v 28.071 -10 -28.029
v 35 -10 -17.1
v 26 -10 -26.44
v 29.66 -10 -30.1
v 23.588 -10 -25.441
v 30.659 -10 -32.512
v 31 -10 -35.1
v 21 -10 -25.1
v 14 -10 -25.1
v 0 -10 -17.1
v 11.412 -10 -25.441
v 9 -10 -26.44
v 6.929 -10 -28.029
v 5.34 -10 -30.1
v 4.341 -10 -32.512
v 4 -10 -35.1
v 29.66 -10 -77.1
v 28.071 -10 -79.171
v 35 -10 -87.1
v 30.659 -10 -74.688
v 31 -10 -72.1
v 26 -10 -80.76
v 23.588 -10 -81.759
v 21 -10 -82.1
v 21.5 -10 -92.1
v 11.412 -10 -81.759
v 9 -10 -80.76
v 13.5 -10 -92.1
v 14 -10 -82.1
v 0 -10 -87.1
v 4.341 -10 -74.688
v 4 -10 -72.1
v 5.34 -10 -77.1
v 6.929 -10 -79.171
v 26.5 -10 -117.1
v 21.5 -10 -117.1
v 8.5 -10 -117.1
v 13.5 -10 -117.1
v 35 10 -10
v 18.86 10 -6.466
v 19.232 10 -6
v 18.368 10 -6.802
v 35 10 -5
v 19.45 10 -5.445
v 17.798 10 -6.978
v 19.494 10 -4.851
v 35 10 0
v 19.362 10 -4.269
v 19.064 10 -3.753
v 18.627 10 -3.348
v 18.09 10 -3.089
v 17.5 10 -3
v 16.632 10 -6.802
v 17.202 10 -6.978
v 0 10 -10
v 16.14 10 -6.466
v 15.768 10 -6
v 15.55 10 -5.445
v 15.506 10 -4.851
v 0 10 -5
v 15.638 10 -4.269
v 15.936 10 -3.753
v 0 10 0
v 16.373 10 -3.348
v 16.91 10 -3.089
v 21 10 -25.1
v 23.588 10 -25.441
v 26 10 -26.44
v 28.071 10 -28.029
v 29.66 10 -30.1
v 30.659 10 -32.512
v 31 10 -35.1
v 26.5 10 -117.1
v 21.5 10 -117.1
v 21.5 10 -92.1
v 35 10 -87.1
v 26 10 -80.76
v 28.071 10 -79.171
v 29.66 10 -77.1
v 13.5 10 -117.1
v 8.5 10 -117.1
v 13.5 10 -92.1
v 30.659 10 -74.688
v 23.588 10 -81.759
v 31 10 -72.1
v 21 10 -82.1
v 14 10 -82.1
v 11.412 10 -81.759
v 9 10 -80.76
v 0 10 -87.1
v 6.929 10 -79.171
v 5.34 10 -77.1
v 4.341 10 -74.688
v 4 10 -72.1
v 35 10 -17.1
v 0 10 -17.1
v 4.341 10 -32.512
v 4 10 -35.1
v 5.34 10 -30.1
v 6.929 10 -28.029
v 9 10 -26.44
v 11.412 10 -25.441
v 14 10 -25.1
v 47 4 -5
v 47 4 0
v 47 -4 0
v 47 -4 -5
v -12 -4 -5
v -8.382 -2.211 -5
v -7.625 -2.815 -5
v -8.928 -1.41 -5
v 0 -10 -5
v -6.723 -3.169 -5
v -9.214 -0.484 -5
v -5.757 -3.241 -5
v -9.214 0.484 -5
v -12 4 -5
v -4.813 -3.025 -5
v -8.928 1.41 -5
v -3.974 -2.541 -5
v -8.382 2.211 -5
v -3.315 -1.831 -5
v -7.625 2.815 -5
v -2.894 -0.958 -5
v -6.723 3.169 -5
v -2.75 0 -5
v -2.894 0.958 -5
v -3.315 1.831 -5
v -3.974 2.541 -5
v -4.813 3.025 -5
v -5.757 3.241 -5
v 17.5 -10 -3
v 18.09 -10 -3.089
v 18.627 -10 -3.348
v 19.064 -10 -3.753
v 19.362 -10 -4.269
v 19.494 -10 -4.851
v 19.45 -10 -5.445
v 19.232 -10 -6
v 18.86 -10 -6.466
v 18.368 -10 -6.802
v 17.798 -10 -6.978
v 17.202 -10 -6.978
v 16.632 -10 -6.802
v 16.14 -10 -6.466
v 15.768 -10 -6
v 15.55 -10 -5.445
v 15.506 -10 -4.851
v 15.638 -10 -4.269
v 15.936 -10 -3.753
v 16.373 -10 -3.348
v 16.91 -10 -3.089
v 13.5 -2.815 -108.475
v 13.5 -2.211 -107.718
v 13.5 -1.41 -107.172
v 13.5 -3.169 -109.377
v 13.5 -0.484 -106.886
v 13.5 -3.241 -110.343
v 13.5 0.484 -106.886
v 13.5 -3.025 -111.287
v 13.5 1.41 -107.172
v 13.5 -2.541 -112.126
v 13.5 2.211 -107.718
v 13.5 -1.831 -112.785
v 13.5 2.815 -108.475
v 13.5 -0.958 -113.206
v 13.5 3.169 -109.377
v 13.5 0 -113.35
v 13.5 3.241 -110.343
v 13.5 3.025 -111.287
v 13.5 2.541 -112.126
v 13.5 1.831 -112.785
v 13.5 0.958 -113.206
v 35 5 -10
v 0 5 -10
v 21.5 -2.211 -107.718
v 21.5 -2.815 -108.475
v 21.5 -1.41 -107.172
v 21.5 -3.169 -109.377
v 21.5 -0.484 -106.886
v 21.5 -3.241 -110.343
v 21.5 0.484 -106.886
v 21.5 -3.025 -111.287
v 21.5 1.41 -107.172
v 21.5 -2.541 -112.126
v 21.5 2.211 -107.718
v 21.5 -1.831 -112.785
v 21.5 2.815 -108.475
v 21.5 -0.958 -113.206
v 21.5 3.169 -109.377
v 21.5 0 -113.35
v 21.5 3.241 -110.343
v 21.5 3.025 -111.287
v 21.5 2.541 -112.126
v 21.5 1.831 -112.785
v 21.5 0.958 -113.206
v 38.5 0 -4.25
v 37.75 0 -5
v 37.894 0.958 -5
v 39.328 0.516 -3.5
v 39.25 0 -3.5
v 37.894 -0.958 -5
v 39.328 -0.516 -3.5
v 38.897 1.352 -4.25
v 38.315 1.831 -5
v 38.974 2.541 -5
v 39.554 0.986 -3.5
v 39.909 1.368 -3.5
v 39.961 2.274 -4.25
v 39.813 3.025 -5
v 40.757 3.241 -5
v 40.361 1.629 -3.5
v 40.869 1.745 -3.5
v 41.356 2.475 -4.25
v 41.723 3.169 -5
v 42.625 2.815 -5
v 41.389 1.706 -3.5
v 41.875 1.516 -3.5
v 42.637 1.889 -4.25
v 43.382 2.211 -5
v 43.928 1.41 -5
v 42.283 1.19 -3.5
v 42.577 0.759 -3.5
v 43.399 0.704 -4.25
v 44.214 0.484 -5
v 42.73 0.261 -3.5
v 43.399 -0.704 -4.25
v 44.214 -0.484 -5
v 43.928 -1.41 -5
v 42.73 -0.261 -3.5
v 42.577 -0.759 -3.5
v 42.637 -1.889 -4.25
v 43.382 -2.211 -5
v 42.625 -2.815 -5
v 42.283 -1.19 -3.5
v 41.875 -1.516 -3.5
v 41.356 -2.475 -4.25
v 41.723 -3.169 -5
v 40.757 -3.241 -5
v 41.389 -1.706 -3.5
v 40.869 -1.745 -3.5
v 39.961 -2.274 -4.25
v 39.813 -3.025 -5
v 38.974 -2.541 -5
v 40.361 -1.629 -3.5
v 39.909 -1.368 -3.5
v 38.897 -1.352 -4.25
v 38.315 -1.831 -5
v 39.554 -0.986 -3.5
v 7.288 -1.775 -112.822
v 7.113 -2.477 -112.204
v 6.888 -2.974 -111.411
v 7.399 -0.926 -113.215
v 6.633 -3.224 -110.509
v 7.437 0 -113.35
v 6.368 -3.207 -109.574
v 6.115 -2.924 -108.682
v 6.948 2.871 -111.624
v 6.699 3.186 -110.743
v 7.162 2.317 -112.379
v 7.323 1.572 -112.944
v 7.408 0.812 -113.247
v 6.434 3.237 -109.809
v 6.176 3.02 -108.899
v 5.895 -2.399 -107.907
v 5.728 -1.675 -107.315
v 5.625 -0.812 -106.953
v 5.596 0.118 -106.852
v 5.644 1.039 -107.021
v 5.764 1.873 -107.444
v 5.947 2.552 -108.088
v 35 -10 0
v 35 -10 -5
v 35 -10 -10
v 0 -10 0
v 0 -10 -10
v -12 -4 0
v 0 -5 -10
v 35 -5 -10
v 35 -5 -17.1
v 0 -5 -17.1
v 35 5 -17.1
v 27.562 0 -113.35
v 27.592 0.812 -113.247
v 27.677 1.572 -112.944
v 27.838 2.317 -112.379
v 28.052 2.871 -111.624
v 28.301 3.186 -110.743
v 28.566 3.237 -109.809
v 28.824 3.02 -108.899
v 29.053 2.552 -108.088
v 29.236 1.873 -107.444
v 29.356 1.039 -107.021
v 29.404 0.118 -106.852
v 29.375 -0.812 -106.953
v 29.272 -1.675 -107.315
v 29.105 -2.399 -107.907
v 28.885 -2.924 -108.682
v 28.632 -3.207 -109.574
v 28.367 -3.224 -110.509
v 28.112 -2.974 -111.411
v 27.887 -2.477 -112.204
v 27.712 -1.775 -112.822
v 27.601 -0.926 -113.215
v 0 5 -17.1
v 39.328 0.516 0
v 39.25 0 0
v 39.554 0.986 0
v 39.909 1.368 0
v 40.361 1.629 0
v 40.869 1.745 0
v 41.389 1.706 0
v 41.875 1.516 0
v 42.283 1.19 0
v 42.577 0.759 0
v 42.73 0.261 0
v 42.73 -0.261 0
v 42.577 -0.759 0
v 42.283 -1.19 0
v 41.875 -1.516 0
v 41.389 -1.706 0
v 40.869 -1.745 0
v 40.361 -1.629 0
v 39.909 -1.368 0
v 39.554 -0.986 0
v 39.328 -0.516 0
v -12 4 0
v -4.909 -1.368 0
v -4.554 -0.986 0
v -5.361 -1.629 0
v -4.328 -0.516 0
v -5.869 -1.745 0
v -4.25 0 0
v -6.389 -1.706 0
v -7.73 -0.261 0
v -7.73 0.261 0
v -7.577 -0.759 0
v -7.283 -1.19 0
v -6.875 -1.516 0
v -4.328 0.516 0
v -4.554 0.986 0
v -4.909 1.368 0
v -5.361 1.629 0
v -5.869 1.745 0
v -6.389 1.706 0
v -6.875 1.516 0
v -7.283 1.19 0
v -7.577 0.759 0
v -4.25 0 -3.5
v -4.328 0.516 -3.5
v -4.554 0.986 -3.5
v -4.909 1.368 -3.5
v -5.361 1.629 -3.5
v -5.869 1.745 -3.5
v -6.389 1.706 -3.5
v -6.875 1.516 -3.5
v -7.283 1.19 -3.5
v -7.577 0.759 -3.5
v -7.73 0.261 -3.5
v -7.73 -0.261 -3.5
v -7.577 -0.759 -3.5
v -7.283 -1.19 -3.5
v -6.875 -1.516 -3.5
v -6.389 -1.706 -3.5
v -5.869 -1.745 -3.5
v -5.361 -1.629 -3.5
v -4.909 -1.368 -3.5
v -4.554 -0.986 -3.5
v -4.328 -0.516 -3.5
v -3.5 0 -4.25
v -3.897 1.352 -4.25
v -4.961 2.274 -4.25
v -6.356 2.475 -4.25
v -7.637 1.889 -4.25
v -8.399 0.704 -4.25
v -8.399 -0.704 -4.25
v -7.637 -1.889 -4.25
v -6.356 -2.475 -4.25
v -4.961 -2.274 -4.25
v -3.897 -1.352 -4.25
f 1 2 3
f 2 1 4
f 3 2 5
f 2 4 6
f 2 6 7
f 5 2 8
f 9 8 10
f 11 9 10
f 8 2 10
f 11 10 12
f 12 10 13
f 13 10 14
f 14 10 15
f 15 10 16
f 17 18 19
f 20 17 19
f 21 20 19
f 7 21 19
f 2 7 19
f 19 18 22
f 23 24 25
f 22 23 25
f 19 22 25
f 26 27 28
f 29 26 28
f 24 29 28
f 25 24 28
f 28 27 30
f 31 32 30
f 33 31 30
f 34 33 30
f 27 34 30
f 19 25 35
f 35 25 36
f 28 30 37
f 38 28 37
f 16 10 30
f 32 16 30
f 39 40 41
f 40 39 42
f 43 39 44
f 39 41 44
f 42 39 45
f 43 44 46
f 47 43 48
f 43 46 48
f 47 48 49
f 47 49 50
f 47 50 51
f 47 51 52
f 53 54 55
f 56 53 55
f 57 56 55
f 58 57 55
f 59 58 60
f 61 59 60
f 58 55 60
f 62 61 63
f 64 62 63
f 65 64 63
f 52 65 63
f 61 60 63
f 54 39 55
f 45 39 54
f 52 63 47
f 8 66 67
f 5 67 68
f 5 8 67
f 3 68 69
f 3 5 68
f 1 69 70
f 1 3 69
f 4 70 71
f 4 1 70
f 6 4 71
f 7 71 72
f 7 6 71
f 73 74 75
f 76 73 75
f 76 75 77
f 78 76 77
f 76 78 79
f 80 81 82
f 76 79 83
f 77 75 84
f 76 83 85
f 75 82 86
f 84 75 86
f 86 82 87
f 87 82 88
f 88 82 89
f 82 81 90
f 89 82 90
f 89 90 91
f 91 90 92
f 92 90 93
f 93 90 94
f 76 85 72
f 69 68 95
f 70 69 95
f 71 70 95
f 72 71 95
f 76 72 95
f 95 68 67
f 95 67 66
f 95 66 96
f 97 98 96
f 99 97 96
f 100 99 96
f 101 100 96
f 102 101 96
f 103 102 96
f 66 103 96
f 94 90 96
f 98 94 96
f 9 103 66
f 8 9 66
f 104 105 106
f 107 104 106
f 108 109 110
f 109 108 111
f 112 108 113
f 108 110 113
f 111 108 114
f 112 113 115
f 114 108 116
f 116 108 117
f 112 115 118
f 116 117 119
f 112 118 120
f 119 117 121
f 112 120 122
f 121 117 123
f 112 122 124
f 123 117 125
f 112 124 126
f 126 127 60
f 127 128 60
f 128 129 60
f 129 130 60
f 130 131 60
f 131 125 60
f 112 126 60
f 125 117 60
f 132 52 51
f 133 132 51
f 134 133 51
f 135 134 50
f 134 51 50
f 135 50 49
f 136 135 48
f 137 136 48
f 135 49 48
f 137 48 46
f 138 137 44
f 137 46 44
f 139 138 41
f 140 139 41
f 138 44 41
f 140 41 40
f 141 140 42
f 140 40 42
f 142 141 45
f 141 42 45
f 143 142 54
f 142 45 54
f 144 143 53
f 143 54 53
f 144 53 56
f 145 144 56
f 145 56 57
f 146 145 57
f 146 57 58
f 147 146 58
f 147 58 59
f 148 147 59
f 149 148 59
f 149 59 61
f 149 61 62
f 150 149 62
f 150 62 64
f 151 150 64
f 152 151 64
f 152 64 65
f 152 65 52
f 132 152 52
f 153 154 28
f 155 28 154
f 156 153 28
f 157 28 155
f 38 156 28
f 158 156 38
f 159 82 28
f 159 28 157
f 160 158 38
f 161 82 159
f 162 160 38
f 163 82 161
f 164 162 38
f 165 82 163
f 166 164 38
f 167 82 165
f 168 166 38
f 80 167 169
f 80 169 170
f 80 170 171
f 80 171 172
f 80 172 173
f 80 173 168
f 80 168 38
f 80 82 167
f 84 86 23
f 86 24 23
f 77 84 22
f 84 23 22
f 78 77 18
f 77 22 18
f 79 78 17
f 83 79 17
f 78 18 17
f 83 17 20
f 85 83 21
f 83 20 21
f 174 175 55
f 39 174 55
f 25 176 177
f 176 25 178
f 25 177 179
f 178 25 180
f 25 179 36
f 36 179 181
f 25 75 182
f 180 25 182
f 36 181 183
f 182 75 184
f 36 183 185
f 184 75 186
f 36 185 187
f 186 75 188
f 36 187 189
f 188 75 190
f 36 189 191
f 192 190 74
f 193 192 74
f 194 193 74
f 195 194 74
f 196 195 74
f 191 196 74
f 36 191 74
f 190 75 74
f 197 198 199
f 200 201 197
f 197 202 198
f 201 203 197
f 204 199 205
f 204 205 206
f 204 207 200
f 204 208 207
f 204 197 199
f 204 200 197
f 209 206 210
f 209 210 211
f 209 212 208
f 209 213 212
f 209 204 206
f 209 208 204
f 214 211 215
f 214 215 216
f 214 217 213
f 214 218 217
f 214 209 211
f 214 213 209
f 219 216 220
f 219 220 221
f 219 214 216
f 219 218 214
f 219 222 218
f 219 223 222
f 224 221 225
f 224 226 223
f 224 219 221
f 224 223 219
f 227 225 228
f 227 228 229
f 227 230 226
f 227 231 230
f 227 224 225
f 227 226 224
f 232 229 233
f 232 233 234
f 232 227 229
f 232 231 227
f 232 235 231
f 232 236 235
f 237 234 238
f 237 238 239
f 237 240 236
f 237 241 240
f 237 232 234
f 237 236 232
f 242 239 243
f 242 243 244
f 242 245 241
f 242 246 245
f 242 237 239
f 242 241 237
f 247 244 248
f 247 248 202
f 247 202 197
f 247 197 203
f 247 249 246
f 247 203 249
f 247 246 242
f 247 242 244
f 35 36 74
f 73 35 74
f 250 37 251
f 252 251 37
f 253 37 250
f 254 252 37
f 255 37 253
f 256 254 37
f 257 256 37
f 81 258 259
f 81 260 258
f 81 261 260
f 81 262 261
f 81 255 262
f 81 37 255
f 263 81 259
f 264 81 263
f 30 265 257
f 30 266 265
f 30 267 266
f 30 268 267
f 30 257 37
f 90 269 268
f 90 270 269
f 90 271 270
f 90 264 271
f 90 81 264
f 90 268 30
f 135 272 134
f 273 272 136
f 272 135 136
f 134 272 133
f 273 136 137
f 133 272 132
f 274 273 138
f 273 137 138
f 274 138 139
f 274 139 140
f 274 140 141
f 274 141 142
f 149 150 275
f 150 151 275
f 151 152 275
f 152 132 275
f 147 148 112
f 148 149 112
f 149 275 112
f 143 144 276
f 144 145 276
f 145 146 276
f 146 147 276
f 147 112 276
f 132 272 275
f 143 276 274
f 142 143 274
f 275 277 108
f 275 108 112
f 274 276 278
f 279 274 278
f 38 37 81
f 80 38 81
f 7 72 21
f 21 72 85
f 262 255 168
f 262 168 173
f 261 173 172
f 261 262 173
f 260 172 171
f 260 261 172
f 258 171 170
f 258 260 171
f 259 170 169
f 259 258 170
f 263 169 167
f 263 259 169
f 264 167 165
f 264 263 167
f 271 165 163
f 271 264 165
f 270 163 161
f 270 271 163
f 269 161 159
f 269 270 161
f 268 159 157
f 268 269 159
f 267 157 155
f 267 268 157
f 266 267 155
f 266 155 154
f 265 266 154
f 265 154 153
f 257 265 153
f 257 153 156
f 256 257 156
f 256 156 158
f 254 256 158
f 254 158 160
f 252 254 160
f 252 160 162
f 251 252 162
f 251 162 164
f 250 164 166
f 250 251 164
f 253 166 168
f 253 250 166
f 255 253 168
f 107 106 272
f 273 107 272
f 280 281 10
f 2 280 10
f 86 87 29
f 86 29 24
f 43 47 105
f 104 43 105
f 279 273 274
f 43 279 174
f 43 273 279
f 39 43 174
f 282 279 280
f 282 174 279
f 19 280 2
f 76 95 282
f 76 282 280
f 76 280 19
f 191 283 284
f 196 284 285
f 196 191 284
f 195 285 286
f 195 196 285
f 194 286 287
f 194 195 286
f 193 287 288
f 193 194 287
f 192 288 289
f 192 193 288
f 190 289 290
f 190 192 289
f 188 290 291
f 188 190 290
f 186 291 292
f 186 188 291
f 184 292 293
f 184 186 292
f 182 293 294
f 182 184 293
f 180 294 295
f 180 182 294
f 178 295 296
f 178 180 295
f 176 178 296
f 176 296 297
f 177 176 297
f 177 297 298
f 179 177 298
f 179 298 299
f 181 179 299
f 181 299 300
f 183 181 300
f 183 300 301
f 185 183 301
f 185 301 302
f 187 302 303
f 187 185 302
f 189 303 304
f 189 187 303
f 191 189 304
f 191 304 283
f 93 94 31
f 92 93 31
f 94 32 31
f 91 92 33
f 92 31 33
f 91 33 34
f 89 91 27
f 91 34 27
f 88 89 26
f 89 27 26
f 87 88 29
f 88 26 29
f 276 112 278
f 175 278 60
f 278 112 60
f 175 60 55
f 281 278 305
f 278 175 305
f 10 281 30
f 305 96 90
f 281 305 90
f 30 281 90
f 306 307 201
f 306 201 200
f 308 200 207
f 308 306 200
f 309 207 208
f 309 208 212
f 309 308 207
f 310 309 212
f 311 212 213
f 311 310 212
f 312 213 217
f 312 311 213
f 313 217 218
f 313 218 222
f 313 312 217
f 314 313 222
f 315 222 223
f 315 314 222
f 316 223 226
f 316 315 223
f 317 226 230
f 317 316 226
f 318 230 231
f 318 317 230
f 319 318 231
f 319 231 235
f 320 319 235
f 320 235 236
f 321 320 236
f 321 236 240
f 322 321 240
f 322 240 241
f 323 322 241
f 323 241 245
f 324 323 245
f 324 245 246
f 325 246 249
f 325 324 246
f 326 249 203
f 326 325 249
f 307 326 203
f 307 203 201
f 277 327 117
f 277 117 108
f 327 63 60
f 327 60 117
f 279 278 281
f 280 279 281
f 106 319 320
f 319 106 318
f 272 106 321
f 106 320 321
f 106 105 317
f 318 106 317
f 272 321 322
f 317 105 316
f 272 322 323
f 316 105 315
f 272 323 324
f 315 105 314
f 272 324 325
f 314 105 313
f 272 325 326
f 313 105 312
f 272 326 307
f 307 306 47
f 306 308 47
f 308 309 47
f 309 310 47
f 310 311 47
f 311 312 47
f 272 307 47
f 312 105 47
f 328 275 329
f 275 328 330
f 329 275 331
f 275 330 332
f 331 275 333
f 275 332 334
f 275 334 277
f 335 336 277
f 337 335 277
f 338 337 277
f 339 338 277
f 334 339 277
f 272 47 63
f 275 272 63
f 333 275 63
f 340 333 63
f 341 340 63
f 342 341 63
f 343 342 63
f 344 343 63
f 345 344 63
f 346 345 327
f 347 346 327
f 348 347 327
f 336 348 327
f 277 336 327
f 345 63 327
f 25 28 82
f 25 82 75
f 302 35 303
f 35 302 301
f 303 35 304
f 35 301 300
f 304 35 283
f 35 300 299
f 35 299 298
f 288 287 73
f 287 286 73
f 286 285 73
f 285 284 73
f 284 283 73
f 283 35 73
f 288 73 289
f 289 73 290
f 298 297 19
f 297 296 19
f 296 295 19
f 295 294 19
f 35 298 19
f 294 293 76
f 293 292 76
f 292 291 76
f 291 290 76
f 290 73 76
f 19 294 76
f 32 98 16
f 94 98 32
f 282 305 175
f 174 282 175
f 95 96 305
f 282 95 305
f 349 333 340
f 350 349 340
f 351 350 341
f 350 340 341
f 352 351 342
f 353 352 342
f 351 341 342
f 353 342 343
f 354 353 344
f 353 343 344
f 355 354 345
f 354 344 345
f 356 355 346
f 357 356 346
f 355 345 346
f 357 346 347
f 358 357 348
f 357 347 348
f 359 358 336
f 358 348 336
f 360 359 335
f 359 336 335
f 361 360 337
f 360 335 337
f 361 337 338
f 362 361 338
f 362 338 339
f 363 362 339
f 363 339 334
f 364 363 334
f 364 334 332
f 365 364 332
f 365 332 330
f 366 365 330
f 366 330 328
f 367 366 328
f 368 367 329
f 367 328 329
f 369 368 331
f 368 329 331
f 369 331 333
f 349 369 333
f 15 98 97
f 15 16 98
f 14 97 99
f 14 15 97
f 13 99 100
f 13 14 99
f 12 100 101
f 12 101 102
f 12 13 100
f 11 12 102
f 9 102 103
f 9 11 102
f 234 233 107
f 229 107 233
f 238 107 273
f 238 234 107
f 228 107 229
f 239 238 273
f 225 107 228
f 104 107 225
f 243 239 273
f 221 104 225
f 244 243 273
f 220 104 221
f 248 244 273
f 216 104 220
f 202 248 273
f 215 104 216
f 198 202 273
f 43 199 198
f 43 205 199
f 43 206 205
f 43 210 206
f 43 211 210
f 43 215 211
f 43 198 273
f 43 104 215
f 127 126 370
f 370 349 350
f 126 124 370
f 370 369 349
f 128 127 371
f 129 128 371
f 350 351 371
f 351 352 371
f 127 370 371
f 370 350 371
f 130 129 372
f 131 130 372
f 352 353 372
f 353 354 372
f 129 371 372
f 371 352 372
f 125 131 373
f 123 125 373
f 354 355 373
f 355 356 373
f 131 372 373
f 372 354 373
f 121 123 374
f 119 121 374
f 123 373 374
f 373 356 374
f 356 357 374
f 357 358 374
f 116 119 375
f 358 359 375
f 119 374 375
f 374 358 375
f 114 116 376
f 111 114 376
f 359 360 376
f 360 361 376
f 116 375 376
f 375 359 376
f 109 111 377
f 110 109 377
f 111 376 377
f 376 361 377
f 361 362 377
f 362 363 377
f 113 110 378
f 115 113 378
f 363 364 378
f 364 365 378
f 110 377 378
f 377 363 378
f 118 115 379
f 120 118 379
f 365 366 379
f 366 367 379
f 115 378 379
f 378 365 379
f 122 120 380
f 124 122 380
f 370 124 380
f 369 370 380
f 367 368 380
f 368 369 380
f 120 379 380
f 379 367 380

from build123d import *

# Parameters (mm, degrees)
CROQUIS1_R                 = 3.25
SALIENTE_EXTRUIR1_DEPTH    = 35
CORTAR_EXTRUIR1_REACH      = 125.844
CROQUIS2_W                 = 8
CROQUIS2_H                 = 25
CROQUIS4_W                 = 27
CROQUIS4_H                 = 57
CORTAR_EXTRUIR2_DEPTH      = 124.844297406
CORTAR_EXTRUIR3_REACH      = 125.844
CROQUIS9_R                 = 1.75
SALIENTE_EXTRUIR3_DEPTH    = 5
CHAFL_N1_SIZE              = 1.5
CHAFL_N1_OF_SIMETR_A3_SIZE = 1.5
ENGANCHE_REACH             = 129.755
CROQUIS7_R                 = 2
REDONDEO1_R                = 10


with BuildPart() as part:
    # Croquis1 → Saliente-Extruir1 (new body)
    with BuildSketch(Plane(origin=(0, 0, 0), x_dir=(0, 0, -1), z_dir=(1, 0, 0))):
        Polygon((0, 10), (0, -10), (10, -10), (10, -5), (17.1, -5), (17.1, -10), (117.1, -10), (117.1, 10), (17.1, 10), (17.1, 5), (10, 5), (10, 10), align=None)
        with Locations((110.1, 0)):
            Circle(CROQUIS1_R, mode=Mode.SUBTRACT)
    extrude(amount=SALIENTE_EXTRUIR1_DEPTH)

    # Croquis2 → Cortar-Extruir1 (cut, up to next)
    with BuildSketch(Plane(origin=(0, 10, 0), x_dir=(1, 0, 0), z_dir=(0, 1, 0)), mode=Mode.PRIVATE) as cortar_extruir1_sk1:
        with Locations((17.5, 104.6)):
            Rectangle(CROQUIS2_W, CROQUIS2_H)
    cortar_extruir1_tool1 = extrude(cortar_extruir1_sk1.sketch, amount=-CORTAR_EXTRUIR1_REACH, mode=Mode.PRIVATE) & part.part
    add(cortar_extruir1_tool1.solids().sort_by_distance((17.5, 10, -104.6))[0], mode=Mode.SUBTRACT)

    # Croquis4 → Cortar-Extruir2 (cut, through all)
    with BuildSketch(Plane(origin=(0, 10, 0), x_dir=(1, 0, 0), z_dir=(0, 1, 0))):
        with Locations((17.5, 53.6)):
            Rectangle(CROQUIS4_W, CROQUIS4_H)
    extrude(amount=-CORTAR_EXTRUIR2_DEPTH, mode=Mode.SUBTRACT)

    # Croquis5 → Cortar-Extruir3 (cut, up to next)
    with BuildSketch(Plane(origin=(0, 10, 0), x_dir=(1, 0, 0), z_dir=(0, 1, 0)), mode=Mode.PRIVATE) as cortar_extruir3_sk1:
        Polygon((8.5, 117.1), (0, 87.1), (0, 117.1), align=None)
    cortar_extruir3_tool1 = extrude(cortar_extruir3_sk1.sketch, amount=-CORTAR_EXTRUIR3_REACH, mode=Mode.PRIVATE) & part.part
    cortar_extruir3 = cortar_extruir3_tool1.solids().sort_by_distance((2.833333, 10, -107.1))[0]
    add(cortar_extruir3, mode=Mode.SUBTRACT)

    # Simetría1: Cortar-Extruir3 across plane
    add(cortar_extruir3.mirror(Plane(origin=(17.5, 0, 0), x_dir=(0, 0, 1), z_dir=(1, 0, 0))), mode=Mode.SUBTRACT)

    # Croquis9 → Saliente-Extruir3 (add)
    with BuildSketch(Plane.XY):
        Polygon((0, 10), (-12, 4), (-12, -4), (0, -10), align=None)
        with Locations((-6, 0)):
            Circle(CROQUIS9_R, mode=Mode.SUBTRACT)
    saliente_extruir3 = extrude(amount=-SALIENTE_EXTRUIR3_DEPTH)

    # Chaflán1
    chafl_n1_edges = [part.edges().sort_by_distance(p)[0] for p in [
        (-7.75, 0, -5),
    ]]
    chamfer(chafl_n1_edges, length=CHAFL_N1_SIZE)

    # Simetría3: Saliente-Extruir3 across plane
    add(saliente_extruir3.mirror(Plane(origin=(17.5, 0, 0), x_dir=(0, 0, 1), z_dir=(1, 0, 0))))

    # Chaflán1 of Simetría3
    chafl_n1_of_simetr_a3_edges = [part.edges().sort_by_distance(p)[0] for p in [
        (42.75, 0, -5),
    ]]
    chamfer(chafl_n1_of_simetr_a3_edges, length=CHAFL_N1_OF_SIMETR_A3_SIZE)

    # Croquis7 → Enganche (cut, up to next)
    with BuildSketch(Plane(origin=(0, 10, 0), x_dir=(1, 0, 0), z_dir=(0, 1, 0)), mode=Mode.PRIVATE) as enganche_sk1:
        with Locations(Location((17.5, 5, 0), (0, 0, 270))):
            Circle(CROQUIS7_R)
    enganche_tool1 = extrude(enganche_sk1.sketch, amount=-ENGANCHE_REACH, mode=Mode.PRIVATE) & part.part
    add(enganche_tool1.solids().sort_by_distance((17.5, 10, -5))[0], mode=Mode.SUBTRACT)

    # Redondeo1
    redondeo1_edges = [part.edges().sort_by_distance(p)[0] for p in [
        (31, 0, -82.1),
        (31, 0, -25.1),
        (4, 0, -25.1),
        (4, 0, -82.1),
    ]]
    fillet(redondeo1_edges, radius=REDONDEO1_R)


solid = part.part
